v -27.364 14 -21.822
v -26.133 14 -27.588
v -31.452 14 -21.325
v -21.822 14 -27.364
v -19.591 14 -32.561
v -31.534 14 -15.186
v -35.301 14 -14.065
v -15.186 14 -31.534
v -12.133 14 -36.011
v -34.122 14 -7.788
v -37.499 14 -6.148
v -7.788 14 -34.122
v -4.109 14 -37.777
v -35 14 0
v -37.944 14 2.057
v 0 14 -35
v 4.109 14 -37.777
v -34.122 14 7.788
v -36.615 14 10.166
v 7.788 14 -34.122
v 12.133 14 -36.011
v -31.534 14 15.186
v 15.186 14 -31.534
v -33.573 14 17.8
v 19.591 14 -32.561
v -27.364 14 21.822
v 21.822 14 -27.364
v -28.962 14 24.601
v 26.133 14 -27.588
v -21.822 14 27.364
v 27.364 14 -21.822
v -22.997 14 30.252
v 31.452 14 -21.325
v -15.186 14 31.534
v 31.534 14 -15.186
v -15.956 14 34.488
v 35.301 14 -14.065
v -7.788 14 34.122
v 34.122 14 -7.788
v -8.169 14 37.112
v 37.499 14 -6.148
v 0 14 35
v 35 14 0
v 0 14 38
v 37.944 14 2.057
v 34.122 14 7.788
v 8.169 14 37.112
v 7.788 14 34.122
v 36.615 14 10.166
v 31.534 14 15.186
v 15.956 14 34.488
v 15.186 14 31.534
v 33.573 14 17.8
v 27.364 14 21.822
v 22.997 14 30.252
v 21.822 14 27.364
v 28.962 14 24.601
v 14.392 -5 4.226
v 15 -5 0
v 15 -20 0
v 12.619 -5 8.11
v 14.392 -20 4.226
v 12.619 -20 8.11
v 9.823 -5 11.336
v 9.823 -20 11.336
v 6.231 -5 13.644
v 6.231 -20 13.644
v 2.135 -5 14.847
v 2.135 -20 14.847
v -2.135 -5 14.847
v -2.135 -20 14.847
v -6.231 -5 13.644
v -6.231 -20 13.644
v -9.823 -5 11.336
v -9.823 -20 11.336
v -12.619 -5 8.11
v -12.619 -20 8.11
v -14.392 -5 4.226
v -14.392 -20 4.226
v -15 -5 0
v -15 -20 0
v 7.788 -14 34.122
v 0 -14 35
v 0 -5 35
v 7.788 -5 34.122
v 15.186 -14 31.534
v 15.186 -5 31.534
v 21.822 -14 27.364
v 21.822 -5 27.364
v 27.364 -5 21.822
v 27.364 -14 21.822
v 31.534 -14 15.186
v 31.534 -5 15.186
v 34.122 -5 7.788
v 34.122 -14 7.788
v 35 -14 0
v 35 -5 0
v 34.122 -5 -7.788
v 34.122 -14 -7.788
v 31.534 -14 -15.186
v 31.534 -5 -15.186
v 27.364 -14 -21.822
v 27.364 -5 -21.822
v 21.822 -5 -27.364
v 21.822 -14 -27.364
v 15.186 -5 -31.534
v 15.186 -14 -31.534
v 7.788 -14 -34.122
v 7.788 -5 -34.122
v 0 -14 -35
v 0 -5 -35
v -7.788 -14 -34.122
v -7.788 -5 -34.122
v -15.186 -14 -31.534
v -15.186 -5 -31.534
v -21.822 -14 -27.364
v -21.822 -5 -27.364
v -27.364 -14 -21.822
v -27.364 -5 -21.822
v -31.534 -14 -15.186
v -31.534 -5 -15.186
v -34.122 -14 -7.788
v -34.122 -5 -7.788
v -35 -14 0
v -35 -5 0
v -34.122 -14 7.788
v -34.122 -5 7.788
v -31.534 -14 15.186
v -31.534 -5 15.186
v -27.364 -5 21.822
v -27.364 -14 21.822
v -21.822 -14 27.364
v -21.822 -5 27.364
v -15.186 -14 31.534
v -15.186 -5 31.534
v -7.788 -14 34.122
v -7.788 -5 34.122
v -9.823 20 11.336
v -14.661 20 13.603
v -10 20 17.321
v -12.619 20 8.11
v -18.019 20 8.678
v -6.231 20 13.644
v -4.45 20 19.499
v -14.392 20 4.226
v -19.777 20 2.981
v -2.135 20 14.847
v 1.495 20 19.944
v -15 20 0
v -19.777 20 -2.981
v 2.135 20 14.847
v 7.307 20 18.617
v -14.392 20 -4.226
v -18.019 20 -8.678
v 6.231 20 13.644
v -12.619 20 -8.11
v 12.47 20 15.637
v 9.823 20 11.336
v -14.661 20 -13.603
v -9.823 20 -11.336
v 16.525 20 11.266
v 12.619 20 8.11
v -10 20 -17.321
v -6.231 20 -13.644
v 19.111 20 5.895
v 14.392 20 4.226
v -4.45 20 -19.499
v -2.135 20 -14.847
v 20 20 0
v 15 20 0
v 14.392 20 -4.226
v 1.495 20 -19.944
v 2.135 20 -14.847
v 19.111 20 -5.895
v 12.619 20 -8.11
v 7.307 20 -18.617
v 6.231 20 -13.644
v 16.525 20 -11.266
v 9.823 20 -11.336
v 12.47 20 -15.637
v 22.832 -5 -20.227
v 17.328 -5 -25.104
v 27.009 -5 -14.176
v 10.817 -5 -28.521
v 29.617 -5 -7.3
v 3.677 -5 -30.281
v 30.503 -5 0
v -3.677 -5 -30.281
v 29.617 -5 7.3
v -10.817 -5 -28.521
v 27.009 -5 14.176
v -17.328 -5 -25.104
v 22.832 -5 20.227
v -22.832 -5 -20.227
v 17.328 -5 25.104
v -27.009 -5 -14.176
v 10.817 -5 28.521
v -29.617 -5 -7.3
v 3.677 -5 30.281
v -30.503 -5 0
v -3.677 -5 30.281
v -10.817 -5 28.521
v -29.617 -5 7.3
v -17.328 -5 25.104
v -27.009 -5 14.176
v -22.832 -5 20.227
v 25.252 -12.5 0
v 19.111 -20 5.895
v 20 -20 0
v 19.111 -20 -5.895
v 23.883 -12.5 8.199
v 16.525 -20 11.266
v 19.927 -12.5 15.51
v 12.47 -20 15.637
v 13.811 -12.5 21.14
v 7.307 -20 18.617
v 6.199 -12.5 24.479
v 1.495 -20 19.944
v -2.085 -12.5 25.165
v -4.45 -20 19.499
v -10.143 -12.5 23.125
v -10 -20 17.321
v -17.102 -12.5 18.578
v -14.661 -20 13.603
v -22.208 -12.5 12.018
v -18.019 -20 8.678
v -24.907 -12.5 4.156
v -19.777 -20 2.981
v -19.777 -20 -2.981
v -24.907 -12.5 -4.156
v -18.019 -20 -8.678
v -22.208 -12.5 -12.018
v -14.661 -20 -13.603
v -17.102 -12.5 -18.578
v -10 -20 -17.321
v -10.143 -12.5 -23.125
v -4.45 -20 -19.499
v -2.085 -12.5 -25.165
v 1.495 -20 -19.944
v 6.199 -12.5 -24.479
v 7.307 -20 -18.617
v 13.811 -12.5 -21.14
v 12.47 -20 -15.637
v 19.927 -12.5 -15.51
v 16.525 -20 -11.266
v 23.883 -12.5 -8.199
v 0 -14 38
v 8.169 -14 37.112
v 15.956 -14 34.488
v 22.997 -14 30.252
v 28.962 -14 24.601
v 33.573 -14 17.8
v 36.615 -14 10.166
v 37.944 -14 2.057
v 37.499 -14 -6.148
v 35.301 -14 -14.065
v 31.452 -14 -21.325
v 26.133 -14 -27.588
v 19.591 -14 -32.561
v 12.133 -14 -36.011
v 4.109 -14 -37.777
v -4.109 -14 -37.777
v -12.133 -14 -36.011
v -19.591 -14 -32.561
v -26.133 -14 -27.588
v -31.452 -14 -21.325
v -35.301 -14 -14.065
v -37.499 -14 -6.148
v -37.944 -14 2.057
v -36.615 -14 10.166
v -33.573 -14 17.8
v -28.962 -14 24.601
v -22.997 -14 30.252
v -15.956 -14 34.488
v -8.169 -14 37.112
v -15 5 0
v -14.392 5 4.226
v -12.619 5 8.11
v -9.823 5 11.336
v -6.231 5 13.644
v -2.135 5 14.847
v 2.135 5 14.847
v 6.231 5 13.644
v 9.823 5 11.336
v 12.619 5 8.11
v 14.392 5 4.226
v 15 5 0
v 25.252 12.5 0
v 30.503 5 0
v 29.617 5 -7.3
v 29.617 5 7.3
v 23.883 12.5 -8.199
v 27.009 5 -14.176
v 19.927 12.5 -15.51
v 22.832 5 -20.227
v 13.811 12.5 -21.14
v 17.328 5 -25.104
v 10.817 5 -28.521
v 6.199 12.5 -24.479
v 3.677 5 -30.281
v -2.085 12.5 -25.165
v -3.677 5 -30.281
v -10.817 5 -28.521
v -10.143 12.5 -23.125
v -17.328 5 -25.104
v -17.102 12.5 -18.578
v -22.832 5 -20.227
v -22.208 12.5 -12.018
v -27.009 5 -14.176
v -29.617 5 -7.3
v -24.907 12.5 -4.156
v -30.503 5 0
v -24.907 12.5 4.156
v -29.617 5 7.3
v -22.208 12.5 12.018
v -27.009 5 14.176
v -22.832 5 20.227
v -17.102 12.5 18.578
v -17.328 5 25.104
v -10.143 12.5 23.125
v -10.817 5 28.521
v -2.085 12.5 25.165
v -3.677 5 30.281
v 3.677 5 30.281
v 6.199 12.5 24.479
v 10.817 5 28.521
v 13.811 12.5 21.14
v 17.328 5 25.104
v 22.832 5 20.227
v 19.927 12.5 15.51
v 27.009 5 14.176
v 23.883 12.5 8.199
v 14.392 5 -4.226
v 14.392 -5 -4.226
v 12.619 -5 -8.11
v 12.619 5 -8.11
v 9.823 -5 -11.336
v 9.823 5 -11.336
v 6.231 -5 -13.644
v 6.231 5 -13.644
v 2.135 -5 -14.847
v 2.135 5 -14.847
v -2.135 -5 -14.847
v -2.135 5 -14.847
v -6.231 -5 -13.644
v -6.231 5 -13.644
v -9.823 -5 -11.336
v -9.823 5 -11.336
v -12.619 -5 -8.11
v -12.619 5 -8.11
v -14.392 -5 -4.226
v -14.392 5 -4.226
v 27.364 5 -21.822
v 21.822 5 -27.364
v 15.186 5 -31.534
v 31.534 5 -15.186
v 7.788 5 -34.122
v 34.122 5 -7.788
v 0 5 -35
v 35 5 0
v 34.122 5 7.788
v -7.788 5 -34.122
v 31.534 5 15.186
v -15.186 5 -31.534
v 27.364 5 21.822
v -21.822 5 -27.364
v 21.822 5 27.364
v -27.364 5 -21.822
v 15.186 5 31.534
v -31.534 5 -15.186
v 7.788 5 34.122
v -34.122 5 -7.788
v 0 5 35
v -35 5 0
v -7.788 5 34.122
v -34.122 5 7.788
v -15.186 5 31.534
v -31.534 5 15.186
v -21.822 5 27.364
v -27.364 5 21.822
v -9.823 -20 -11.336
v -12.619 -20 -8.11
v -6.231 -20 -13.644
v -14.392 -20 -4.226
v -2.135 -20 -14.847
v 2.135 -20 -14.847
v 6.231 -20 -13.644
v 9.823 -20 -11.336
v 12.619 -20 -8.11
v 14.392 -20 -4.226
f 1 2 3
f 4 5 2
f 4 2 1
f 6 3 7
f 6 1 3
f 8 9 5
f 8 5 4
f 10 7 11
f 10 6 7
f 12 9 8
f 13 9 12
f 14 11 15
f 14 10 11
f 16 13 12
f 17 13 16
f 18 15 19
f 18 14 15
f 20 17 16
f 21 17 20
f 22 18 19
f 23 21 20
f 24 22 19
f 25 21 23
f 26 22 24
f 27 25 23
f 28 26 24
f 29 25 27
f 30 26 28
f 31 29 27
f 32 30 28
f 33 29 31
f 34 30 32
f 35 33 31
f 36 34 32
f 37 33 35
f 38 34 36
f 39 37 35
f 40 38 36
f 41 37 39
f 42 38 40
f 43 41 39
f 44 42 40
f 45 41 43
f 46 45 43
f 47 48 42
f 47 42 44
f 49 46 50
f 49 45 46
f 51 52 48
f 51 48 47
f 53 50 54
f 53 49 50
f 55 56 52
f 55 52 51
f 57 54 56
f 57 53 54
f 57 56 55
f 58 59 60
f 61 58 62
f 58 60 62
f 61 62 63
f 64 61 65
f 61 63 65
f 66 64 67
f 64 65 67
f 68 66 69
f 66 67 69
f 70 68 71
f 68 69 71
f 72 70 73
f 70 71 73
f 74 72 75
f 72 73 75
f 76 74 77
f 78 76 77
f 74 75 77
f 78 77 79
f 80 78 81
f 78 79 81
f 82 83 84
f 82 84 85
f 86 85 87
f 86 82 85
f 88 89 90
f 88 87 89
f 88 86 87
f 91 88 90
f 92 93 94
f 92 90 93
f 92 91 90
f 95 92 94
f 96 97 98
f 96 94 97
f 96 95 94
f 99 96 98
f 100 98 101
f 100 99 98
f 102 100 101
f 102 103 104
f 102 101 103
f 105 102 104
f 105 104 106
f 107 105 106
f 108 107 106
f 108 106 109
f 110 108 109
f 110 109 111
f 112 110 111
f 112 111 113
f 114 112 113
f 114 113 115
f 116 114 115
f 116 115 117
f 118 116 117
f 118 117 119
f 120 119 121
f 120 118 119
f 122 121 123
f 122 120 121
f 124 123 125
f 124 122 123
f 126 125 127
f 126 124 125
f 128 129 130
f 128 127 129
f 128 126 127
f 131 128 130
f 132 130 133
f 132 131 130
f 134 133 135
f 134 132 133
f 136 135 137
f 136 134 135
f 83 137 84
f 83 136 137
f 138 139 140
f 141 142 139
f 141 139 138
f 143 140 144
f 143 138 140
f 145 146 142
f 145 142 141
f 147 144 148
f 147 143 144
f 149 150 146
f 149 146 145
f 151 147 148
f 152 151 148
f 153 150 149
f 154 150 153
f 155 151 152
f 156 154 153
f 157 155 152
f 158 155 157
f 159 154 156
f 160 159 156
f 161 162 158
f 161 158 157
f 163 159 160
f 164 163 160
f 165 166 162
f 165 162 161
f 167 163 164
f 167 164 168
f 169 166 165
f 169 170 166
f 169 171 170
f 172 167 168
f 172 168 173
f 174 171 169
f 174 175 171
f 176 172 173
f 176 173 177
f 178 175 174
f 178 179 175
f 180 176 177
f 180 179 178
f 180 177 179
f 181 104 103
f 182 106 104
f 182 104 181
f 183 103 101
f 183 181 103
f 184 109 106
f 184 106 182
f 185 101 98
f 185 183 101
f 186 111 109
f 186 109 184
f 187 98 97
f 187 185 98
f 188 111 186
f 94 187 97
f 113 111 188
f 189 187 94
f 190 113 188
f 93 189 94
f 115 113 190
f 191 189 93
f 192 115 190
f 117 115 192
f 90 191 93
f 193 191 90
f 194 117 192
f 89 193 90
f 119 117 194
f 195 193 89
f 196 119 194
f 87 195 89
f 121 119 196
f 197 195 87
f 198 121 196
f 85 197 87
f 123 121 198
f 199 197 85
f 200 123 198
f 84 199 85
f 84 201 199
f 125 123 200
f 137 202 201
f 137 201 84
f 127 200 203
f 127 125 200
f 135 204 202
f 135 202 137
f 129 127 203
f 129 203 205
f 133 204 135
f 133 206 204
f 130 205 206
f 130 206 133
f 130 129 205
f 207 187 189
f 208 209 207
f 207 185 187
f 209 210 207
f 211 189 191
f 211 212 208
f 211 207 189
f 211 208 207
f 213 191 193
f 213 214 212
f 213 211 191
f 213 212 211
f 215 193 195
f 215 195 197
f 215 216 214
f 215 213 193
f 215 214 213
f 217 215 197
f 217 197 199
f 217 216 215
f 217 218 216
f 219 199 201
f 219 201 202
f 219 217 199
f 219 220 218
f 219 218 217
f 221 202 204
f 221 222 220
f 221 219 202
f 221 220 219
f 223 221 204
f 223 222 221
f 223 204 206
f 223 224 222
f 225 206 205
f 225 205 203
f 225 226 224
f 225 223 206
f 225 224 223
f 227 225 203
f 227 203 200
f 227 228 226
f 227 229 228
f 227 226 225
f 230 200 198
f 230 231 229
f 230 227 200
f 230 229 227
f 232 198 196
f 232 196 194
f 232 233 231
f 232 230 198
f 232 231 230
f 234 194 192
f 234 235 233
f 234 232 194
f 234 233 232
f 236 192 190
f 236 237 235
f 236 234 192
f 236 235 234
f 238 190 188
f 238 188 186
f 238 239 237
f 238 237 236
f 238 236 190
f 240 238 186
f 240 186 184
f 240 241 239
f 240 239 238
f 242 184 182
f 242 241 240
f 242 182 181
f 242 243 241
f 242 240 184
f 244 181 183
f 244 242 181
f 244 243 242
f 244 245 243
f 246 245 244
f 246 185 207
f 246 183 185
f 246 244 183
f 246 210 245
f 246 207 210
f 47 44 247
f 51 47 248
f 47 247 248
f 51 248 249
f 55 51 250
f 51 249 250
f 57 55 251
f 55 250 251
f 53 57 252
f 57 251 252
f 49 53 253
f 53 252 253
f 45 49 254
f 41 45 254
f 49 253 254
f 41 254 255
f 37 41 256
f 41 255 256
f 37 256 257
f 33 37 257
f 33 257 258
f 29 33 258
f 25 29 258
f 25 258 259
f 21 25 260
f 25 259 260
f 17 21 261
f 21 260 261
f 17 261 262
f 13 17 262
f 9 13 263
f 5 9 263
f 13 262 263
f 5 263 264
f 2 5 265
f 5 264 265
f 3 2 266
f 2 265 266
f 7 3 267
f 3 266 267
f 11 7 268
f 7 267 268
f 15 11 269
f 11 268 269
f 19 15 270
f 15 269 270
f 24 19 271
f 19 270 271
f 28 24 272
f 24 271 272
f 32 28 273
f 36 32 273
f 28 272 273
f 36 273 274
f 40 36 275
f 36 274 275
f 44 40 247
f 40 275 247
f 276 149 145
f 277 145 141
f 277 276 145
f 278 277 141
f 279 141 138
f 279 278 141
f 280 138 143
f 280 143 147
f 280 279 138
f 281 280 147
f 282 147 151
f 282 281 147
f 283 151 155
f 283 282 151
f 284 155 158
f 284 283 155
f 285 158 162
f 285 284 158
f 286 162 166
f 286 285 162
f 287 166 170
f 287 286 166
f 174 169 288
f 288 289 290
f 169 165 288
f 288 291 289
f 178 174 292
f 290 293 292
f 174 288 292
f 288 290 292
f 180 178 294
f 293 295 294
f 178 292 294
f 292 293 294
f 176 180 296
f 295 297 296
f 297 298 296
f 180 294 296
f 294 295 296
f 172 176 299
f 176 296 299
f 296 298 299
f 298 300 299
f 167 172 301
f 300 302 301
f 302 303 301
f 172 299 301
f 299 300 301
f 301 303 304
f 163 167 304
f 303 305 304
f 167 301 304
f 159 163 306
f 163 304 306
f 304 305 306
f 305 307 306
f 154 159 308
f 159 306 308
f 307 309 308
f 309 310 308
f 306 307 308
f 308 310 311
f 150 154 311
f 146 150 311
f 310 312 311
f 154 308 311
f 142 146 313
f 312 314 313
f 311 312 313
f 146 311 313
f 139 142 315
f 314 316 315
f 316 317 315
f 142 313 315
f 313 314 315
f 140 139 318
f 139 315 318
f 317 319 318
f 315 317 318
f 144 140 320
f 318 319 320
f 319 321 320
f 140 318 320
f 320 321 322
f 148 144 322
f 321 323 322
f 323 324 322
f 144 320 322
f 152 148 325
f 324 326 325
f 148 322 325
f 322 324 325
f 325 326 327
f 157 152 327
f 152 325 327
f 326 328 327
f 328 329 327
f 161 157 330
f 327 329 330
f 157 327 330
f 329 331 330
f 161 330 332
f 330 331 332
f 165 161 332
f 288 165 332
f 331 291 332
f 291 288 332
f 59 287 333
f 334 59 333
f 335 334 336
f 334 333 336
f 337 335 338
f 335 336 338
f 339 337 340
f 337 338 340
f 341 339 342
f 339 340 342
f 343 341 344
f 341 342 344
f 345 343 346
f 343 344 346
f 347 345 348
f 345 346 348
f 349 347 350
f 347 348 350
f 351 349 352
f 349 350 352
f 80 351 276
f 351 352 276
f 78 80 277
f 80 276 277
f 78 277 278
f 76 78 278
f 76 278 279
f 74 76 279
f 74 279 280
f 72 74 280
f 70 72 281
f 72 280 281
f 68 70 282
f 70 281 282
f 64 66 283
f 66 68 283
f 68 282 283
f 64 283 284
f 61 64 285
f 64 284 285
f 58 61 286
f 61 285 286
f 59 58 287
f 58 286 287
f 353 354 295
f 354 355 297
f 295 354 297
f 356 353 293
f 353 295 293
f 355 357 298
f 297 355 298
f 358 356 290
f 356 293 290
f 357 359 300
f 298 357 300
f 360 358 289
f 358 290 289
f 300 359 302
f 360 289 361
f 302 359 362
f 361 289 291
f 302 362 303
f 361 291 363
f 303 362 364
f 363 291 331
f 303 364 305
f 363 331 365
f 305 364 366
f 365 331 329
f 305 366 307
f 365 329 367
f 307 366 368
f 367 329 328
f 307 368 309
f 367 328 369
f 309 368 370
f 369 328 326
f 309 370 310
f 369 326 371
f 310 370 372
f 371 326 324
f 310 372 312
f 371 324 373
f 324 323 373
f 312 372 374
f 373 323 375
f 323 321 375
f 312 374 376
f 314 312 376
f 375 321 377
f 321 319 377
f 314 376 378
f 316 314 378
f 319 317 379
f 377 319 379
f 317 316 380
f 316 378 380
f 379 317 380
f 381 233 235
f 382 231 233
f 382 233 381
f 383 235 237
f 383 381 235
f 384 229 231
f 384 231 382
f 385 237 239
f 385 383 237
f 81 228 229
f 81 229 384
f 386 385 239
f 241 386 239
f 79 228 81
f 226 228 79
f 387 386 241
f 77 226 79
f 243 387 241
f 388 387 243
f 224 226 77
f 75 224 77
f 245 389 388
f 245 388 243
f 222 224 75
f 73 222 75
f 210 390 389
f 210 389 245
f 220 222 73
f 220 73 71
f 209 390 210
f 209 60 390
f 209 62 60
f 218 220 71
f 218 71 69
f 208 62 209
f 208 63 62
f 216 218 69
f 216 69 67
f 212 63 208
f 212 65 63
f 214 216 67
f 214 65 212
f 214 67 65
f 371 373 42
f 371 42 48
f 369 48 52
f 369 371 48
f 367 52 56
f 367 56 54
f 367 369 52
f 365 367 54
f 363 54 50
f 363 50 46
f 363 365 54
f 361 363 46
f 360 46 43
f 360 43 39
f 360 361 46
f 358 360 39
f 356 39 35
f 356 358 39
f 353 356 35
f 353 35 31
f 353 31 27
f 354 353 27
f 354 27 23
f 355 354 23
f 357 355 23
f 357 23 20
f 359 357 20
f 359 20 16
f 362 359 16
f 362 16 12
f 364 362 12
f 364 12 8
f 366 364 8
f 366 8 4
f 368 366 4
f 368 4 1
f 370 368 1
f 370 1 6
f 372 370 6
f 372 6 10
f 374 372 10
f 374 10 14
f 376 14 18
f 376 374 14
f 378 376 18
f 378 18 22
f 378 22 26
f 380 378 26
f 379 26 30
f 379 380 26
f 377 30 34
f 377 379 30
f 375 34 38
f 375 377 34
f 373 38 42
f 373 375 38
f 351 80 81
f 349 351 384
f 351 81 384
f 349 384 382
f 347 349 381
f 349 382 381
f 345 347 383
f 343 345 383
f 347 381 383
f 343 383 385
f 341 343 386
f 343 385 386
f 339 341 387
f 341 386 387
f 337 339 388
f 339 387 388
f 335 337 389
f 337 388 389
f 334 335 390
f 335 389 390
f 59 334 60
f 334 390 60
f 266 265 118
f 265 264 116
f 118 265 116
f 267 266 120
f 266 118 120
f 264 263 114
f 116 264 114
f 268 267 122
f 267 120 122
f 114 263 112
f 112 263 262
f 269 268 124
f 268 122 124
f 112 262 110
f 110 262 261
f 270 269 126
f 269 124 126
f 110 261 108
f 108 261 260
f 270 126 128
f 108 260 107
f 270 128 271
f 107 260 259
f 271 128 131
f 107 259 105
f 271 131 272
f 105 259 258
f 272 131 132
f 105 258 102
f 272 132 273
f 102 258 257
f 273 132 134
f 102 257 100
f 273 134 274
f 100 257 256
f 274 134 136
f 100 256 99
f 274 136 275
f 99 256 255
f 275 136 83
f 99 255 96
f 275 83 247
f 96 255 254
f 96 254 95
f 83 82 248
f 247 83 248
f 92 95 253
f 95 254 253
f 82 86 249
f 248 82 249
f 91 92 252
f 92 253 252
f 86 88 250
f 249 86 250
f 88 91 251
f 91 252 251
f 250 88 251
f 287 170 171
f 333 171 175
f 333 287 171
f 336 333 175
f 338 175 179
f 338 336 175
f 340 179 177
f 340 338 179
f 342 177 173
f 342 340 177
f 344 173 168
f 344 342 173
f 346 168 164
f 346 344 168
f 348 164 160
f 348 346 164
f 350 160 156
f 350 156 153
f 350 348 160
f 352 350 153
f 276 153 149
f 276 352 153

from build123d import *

# Parameters (mm, degrees)
BOSS_EXTRUDE1_DEPTH      = 14
BOSS_EXTRUDE1_DEPTH_BACK = 14
SKETCH1_R                = 38
SKETCH1_R_2              = 35
BOSS_EXTRUDE2_DEPTH      = 5
BOSS_EXTRUDE2_DEPTH_BACK = 5
SKETCH2_R                = 35
SKETCH5_R                = 20
SKETCH5_R_2              = 15
BOSS_EXTRUDE3_DEPTH      = 15
BOSS_EXTRUDE4_START      = 15
SKETCH6_R                = 20
SKETCH6_R_2              = 15
BOSS_EXTRUDE4_DEPTH      = 15
DRAFT2_ANGLE             = 35
DRAFT3_ANGLE             = 35
SKETCH14_R               = 12
CUT_EXTRUDE3_DEPTH       = 15
SKETCH15_R               = 15
CUT_EXTRUDE4_DEPTH       = 33.5


with BuildPart() as part:
    # Sketch1 → Boss-Extrude1 (new, two sides: drawn at the far end of the back side and taken through both)
    with BuildSketch(Plane(origin=(0, 0, 0), x_dir=(1, 0, 0), z_dir=(0, 1, 0)).offset(-BOSS_EXTRUDE1_DEPTH_BACK)):
        Circle(SKETCH1_R)
        Circle(SKETCH1_R_2, mode=Mode.SUBTRACT)
    extrude(amount=BOSS_EXTRUDE1_DEPTH + BOSS_EXTRUDE1_DEPTH_BACK)

    # Sketch2 → Boss-Extrude2 (add, two sides: drawn at the far end of the back side and taken through both)
    with BuildSketch(Plane(origin=(0, 0, 0), x_dir=(-1, 0, 0), z_dir=(0, -1, 0)).offset(-BOSS_EXTRUDE2_DEPTH_BACK)):
        Circle(SKETCH2_R)
    extrude(amount=BOSS_EXTRUDE2_DEPTH + BOSS_EXTRUDE2_DEPTH_BACK)

    # Sketch5 → Boss-Extrude3 (add)
    with BuildSketch(Plane(origin=(0, 5, 0), x_dir=(1, 0, 0), z_dir=(0, 1, 0))):
        Circle(SKETCH5_R)
        Circle(SKETCH5_R_2, mode=Mode.SUBTRACT)
    extrude(amount=BOSS_EXTRUDE3_DEPTH)

    # Sketch6 → Boss-Extrude4 (add)
    with BuildSketch(Plane.XZ.offset(5).offset(BOSS_EXTRUDE4_START)):
        Circle(SKETCH6_R)
        Circle(SKETCH6_R_2, mode=Mode.SUBTRACT)
    extrude(amount=-BOSS_EXTRUDE4_DEPTH)

    # Draft2
    draft2_faces = [part.faces().sort_by_distance(p)[0] for p in [
        (-20, 12.5, 0),
    ]]
    draft(draft2_faces, Plane(origin=(0, 20, 0), x_dir=(1, 0, 0), z_dir=(0, 1, 0)), DRAFT2_ANGLE)

    # Draft3
    draft3_faces = [part.faces().sort_by_distance(p)[0] for p in [
        (-20, -12.5, 0),
    ]]
    draft(draft3_faces, Plane(origin=(0, -20, 0), x_dir=(-1, 0, 0), z_dir=(0, -1, 0)), DRAFT3_ANGLE)

    # Sketch14 → Cut-Extrude3 (cut)
    with BuildSketch(Plane.XZ.offset(5)):
        Circle(SKETCH14_R)
    extrude(amount=-CUT_EXTRUDE3_DEPTH, mode=Mode.SUBTRACT)

    # Sketch15 → Cut-Extrude4 (cut, symmetric)
    with BuildSketch(Plane(origin=(0, 5, 0), x_dir=(1, 0, 0), z_dir=(0, 1, 0))):
        Circle(SKETCH15_R)
    extrude(amount=CUT_EXTRUDE4_DEPTH, both=True, mode=Mode.SUBTRACT)


solid = part.part
